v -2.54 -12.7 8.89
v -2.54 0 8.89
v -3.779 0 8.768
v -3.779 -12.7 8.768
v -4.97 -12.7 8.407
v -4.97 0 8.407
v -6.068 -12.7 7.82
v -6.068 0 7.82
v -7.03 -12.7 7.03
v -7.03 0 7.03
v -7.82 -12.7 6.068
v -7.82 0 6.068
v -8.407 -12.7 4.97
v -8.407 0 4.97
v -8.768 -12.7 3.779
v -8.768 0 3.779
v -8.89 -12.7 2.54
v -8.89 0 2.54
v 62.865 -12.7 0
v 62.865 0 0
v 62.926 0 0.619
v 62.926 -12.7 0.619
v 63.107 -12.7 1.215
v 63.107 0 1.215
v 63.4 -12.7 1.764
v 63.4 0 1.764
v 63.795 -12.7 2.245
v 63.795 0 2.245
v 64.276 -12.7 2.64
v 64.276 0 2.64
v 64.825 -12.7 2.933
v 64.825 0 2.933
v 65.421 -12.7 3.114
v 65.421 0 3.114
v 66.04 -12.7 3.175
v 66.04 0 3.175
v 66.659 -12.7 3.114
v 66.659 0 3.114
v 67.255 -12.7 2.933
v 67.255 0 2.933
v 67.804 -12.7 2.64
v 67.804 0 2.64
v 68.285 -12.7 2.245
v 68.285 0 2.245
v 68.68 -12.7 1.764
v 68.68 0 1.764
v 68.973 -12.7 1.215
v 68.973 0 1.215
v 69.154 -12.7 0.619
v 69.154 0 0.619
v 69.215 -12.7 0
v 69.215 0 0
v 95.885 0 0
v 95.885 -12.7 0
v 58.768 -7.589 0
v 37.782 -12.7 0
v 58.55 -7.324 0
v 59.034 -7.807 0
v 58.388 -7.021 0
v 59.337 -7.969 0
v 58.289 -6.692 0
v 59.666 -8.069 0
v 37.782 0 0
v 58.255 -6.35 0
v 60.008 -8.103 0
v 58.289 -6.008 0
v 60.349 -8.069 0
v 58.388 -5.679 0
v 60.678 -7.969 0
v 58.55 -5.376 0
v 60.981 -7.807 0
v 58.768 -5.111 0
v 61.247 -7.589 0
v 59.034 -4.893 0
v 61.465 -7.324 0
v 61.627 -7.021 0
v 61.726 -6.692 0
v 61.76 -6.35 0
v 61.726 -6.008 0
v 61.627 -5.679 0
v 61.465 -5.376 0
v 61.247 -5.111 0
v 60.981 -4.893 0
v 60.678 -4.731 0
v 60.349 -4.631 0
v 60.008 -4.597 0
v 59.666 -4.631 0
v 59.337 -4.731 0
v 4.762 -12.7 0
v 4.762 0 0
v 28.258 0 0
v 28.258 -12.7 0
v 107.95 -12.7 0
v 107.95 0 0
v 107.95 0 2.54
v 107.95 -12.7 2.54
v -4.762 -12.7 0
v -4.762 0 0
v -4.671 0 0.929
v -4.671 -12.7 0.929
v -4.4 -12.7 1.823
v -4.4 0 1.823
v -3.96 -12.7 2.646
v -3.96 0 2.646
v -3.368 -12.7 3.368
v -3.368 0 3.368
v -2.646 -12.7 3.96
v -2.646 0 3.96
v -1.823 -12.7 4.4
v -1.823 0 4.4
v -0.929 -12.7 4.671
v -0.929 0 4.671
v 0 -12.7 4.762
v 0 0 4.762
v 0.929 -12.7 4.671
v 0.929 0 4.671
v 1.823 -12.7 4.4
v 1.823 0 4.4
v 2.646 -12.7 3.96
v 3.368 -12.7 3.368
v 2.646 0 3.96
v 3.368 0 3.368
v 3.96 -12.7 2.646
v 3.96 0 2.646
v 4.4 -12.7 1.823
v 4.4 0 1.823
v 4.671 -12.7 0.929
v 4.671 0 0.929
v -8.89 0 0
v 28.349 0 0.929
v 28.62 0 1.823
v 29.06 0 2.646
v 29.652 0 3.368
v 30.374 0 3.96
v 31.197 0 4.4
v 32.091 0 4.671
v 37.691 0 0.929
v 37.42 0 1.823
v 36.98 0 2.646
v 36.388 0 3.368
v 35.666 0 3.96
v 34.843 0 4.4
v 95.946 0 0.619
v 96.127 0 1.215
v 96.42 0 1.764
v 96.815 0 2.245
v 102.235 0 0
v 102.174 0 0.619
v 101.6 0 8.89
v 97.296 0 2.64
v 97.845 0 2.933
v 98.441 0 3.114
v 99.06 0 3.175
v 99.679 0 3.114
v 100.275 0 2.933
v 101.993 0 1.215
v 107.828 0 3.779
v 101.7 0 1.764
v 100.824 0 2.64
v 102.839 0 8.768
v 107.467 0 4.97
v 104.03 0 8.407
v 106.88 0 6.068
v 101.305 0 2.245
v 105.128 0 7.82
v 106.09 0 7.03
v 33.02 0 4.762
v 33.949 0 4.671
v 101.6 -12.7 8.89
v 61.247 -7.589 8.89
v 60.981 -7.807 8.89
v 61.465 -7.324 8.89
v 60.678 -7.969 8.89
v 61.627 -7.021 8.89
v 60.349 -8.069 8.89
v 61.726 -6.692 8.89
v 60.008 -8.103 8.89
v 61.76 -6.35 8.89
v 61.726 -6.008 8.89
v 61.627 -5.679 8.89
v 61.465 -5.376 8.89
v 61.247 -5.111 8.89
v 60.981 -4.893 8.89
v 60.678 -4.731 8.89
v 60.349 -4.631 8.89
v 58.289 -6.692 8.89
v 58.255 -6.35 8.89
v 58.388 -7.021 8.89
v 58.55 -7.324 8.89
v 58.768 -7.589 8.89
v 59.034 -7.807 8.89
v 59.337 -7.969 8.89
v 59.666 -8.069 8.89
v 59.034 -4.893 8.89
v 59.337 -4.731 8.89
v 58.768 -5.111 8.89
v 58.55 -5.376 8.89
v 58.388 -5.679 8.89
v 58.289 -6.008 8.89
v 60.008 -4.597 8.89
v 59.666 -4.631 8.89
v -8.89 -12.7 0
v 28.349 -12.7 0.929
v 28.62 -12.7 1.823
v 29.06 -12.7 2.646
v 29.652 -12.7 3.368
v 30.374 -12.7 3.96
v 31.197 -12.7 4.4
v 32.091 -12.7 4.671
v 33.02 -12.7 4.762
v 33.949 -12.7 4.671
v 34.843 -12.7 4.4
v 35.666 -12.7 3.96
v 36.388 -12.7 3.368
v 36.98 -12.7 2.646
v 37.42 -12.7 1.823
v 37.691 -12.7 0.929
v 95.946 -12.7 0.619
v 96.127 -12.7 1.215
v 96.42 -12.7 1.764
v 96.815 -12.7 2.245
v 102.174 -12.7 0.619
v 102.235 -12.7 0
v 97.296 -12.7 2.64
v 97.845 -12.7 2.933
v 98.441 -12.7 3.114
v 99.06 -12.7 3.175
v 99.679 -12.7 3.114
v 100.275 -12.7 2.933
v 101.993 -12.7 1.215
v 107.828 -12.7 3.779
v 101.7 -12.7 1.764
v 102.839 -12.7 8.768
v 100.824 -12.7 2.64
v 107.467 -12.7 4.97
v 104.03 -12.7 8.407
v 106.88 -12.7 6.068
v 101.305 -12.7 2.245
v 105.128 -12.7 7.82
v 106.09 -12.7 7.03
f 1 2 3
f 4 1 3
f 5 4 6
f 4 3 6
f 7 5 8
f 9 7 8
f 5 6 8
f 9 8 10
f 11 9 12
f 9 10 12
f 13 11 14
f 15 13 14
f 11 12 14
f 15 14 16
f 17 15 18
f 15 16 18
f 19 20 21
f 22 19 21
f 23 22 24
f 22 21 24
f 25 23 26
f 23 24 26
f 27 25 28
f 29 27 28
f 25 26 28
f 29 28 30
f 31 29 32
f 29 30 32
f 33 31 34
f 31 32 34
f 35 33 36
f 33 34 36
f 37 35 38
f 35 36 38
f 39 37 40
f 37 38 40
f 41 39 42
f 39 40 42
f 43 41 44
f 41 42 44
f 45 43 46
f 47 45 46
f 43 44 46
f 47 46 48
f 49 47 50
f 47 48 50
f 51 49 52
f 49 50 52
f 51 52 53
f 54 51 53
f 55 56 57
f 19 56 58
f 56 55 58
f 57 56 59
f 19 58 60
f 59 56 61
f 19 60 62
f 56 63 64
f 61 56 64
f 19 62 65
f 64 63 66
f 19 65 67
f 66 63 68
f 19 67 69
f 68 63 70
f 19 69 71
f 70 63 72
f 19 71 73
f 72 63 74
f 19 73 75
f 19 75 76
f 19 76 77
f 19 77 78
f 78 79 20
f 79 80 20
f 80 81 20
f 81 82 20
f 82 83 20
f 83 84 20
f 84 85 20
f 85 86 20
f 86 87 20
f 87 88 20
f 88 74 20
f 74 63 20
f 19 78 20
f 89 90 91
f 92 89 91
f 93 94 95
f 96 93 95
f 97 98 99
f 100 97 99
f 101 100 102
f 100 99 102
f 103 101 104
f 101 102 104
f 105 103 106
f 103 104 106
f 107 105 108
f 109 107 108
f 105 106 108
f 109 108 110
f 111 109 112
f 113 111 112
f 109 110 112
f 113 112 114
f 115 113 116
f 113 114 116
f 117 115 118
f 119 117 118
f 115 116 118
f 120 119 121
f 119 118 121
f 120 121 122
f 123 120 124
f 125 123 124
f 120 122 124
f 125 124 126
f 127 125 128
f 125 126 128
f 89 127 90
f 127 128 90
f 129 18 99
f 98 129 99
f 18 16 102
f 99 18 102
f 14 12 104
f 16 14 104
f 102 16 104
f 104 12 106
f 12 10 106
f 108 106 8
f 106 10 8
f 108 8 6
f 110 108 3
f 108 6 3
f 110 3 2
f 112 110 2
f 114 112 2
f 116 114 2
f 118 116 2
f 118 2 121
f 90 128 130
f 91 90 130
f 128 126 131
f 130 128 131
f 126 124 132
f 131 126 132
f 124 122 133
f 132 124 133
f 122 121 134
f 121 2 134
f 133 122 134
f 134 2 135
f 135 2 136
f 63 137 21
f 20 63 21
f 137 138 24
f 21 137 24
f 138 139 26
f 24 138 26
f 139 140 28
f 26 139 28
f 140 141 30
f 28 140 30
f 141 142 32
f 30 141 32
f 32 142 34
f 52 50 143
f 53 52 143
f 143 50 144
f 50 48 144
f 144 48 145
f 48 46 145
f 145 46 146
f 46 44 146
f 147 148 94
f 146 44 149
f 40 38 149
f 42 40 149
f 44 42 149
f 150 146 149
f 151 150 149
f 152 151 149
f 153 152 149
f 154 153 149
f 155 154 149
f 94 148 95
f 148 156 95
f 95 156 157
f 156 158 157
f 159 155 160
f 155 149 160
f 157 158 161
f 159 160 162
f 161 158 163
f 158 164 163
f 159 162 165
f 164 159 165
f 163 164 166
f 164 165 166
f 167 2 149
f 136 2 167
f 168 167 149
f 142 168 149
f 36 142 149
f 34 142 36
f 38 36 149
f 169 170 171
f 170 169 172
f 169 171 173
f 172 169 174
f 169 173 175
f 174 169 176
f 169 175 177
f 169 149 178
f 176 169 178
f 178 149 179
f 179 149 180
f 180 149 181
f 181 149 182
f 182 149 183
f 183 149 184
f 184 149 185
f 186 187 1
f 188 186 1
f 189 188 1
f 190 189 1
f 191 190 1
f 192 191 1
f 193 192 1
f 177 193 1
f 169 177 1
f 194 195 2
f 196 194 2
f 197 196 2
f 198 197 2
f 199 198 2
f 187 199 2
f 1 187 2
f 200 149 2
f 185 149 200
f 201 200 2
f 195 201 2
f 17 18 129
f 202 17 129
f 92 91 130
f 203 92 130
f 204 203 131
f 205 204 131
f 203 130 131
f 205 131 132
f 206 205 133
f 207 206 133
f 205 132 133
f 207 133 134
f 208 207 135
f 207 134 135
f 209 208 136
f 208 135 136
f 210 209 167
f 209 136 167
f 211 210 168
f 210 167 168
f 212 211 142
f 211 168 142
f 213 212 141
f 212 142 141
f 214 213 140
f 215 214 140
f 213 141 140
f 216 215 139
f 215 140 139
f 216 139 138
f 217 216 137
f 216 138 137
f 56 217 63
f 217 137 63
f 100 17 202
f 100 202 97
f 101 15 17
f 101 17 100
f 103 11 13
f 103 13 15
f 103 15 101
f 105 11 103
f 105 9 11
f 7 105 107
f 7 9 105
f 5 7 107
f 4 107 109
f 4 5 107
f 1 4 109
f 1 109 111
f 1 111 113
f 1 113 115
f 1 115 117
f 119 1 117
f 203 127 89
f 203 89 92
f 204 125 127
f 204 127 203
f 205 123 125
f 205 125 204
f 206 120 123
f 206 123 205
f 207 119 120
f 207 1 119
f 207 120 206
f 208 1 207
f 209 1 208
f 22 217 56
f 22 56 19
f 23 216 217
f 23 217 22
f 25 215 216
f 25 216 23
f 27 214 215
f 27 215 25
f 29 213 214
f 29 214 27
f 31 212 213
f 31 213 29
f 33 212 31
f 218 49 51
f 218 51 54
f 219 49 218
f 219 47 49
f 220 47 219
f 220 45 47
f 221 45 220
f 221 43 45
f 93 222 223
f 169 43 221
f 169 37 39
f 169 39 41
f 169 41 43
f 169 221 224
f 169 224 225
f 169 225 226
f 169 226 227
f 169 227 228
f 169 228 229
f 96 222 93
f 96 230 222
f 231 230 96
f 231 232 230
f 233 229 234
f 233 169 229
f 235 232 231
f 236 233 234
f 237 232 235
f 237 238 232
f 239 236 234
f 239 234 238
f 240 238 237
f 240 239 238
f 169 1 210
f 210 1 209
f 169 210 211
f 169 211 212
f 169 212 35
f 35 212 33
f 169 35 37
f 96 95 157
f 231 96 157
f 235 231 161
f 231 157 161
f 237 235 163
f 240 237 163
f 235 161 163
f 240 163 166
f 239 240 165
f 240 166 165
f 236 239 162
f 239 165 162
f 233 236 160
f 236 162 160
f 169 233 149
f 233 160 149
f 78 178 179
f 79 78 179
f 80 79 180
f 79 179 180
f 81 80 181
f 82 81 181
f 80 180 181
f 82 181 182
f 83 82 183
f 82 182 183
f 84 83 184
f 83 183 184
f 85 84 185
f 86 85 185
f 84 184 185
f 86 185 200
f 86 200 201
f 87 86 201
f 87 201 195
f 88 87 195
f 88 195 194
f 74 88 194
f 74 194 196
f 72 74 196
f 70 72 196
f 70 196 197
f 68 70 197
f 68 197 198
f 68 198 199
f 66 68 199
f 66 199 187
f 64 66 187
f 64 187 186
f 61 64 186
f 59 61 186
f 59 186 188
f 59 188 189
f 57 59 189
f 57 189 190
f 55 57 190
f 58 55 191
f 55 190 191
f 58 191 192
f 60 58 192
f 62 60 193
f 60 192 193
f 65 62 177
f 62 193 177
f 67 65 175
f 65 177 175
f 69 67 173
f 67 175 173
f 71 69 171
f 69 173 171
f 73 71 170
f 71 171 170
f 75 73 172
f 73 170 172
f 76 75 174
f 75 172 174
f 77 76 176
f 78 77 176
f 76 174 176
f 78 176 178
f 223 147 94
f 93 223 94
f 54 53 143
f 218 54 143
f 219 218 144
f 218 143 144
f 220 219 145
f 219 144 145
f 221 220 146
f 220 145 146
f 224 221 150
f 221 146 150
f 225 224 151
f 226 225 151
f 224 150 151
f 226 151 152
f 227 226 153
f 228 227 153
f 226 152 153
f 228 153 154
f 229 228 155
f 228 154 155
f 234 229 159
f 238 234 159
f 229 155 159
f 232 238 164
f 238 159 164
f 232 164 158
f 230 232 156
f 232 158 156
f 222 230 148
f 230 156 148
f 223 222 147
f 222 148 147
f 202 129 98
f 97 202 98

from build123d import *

# Parameters (mm, degrees)
F1_DEPTH = 12.7
F2_R     = 1.7526
F3_DEPTH = 25.4


with BuildPart() as f1:
    # F0 (on Front) → F1 (new body)
    with BuildSketch(Plane.XZ):
        with BuildLine():
            ThreePointArc((-4.7625, 0), (0, 4.7625), (4.7625, 0))
            Line((4.7625, 0), (28.2575, 0))
            ThreePointArc((28.2575, 0), (33.02, 4.7625), (37.7825, 0))
            Line((37.7825, 0), (62.865, 0))
            ThreePointArc((62.865, 0), (66.04, 3.175), (69.215, 0))
            Line((69.215, 0), (95.885, 0))
            ThreePointArc((95.885, 0), (99.06, 3.175), (102.235, 0))
            Line((102.235, 0), (107.95, 0))
            Line((107.95, 0), (107.95, 2.54))
            ThreePointArc((107.95, 2.54), (106.090128, 7.030128), (101.6, 8.89))
            Line((101.6, 8.89), (-2.54, 8.89))
            ThreePointArc((-2.54, 8.89), (-7.030128, 7.030128), (-8.89, 2.54))
            Line((-8.89, 2.54), (-8.89, 0))
            Line((-8.89, 0), (-4.7625, 0))
        make_face()
    extrude(amount=F1_DEPTH)

    # F2 (on face) → F3 (cut)
    with BuildSketch(Plane.XY.offset(8.89)):
        with Locations((60.0075, -6.35)):
            Circle(F2_R)
    extrude(amount=-F3_DEPTH, mode=Mode.SUBTRACT)


solid = f1.part
